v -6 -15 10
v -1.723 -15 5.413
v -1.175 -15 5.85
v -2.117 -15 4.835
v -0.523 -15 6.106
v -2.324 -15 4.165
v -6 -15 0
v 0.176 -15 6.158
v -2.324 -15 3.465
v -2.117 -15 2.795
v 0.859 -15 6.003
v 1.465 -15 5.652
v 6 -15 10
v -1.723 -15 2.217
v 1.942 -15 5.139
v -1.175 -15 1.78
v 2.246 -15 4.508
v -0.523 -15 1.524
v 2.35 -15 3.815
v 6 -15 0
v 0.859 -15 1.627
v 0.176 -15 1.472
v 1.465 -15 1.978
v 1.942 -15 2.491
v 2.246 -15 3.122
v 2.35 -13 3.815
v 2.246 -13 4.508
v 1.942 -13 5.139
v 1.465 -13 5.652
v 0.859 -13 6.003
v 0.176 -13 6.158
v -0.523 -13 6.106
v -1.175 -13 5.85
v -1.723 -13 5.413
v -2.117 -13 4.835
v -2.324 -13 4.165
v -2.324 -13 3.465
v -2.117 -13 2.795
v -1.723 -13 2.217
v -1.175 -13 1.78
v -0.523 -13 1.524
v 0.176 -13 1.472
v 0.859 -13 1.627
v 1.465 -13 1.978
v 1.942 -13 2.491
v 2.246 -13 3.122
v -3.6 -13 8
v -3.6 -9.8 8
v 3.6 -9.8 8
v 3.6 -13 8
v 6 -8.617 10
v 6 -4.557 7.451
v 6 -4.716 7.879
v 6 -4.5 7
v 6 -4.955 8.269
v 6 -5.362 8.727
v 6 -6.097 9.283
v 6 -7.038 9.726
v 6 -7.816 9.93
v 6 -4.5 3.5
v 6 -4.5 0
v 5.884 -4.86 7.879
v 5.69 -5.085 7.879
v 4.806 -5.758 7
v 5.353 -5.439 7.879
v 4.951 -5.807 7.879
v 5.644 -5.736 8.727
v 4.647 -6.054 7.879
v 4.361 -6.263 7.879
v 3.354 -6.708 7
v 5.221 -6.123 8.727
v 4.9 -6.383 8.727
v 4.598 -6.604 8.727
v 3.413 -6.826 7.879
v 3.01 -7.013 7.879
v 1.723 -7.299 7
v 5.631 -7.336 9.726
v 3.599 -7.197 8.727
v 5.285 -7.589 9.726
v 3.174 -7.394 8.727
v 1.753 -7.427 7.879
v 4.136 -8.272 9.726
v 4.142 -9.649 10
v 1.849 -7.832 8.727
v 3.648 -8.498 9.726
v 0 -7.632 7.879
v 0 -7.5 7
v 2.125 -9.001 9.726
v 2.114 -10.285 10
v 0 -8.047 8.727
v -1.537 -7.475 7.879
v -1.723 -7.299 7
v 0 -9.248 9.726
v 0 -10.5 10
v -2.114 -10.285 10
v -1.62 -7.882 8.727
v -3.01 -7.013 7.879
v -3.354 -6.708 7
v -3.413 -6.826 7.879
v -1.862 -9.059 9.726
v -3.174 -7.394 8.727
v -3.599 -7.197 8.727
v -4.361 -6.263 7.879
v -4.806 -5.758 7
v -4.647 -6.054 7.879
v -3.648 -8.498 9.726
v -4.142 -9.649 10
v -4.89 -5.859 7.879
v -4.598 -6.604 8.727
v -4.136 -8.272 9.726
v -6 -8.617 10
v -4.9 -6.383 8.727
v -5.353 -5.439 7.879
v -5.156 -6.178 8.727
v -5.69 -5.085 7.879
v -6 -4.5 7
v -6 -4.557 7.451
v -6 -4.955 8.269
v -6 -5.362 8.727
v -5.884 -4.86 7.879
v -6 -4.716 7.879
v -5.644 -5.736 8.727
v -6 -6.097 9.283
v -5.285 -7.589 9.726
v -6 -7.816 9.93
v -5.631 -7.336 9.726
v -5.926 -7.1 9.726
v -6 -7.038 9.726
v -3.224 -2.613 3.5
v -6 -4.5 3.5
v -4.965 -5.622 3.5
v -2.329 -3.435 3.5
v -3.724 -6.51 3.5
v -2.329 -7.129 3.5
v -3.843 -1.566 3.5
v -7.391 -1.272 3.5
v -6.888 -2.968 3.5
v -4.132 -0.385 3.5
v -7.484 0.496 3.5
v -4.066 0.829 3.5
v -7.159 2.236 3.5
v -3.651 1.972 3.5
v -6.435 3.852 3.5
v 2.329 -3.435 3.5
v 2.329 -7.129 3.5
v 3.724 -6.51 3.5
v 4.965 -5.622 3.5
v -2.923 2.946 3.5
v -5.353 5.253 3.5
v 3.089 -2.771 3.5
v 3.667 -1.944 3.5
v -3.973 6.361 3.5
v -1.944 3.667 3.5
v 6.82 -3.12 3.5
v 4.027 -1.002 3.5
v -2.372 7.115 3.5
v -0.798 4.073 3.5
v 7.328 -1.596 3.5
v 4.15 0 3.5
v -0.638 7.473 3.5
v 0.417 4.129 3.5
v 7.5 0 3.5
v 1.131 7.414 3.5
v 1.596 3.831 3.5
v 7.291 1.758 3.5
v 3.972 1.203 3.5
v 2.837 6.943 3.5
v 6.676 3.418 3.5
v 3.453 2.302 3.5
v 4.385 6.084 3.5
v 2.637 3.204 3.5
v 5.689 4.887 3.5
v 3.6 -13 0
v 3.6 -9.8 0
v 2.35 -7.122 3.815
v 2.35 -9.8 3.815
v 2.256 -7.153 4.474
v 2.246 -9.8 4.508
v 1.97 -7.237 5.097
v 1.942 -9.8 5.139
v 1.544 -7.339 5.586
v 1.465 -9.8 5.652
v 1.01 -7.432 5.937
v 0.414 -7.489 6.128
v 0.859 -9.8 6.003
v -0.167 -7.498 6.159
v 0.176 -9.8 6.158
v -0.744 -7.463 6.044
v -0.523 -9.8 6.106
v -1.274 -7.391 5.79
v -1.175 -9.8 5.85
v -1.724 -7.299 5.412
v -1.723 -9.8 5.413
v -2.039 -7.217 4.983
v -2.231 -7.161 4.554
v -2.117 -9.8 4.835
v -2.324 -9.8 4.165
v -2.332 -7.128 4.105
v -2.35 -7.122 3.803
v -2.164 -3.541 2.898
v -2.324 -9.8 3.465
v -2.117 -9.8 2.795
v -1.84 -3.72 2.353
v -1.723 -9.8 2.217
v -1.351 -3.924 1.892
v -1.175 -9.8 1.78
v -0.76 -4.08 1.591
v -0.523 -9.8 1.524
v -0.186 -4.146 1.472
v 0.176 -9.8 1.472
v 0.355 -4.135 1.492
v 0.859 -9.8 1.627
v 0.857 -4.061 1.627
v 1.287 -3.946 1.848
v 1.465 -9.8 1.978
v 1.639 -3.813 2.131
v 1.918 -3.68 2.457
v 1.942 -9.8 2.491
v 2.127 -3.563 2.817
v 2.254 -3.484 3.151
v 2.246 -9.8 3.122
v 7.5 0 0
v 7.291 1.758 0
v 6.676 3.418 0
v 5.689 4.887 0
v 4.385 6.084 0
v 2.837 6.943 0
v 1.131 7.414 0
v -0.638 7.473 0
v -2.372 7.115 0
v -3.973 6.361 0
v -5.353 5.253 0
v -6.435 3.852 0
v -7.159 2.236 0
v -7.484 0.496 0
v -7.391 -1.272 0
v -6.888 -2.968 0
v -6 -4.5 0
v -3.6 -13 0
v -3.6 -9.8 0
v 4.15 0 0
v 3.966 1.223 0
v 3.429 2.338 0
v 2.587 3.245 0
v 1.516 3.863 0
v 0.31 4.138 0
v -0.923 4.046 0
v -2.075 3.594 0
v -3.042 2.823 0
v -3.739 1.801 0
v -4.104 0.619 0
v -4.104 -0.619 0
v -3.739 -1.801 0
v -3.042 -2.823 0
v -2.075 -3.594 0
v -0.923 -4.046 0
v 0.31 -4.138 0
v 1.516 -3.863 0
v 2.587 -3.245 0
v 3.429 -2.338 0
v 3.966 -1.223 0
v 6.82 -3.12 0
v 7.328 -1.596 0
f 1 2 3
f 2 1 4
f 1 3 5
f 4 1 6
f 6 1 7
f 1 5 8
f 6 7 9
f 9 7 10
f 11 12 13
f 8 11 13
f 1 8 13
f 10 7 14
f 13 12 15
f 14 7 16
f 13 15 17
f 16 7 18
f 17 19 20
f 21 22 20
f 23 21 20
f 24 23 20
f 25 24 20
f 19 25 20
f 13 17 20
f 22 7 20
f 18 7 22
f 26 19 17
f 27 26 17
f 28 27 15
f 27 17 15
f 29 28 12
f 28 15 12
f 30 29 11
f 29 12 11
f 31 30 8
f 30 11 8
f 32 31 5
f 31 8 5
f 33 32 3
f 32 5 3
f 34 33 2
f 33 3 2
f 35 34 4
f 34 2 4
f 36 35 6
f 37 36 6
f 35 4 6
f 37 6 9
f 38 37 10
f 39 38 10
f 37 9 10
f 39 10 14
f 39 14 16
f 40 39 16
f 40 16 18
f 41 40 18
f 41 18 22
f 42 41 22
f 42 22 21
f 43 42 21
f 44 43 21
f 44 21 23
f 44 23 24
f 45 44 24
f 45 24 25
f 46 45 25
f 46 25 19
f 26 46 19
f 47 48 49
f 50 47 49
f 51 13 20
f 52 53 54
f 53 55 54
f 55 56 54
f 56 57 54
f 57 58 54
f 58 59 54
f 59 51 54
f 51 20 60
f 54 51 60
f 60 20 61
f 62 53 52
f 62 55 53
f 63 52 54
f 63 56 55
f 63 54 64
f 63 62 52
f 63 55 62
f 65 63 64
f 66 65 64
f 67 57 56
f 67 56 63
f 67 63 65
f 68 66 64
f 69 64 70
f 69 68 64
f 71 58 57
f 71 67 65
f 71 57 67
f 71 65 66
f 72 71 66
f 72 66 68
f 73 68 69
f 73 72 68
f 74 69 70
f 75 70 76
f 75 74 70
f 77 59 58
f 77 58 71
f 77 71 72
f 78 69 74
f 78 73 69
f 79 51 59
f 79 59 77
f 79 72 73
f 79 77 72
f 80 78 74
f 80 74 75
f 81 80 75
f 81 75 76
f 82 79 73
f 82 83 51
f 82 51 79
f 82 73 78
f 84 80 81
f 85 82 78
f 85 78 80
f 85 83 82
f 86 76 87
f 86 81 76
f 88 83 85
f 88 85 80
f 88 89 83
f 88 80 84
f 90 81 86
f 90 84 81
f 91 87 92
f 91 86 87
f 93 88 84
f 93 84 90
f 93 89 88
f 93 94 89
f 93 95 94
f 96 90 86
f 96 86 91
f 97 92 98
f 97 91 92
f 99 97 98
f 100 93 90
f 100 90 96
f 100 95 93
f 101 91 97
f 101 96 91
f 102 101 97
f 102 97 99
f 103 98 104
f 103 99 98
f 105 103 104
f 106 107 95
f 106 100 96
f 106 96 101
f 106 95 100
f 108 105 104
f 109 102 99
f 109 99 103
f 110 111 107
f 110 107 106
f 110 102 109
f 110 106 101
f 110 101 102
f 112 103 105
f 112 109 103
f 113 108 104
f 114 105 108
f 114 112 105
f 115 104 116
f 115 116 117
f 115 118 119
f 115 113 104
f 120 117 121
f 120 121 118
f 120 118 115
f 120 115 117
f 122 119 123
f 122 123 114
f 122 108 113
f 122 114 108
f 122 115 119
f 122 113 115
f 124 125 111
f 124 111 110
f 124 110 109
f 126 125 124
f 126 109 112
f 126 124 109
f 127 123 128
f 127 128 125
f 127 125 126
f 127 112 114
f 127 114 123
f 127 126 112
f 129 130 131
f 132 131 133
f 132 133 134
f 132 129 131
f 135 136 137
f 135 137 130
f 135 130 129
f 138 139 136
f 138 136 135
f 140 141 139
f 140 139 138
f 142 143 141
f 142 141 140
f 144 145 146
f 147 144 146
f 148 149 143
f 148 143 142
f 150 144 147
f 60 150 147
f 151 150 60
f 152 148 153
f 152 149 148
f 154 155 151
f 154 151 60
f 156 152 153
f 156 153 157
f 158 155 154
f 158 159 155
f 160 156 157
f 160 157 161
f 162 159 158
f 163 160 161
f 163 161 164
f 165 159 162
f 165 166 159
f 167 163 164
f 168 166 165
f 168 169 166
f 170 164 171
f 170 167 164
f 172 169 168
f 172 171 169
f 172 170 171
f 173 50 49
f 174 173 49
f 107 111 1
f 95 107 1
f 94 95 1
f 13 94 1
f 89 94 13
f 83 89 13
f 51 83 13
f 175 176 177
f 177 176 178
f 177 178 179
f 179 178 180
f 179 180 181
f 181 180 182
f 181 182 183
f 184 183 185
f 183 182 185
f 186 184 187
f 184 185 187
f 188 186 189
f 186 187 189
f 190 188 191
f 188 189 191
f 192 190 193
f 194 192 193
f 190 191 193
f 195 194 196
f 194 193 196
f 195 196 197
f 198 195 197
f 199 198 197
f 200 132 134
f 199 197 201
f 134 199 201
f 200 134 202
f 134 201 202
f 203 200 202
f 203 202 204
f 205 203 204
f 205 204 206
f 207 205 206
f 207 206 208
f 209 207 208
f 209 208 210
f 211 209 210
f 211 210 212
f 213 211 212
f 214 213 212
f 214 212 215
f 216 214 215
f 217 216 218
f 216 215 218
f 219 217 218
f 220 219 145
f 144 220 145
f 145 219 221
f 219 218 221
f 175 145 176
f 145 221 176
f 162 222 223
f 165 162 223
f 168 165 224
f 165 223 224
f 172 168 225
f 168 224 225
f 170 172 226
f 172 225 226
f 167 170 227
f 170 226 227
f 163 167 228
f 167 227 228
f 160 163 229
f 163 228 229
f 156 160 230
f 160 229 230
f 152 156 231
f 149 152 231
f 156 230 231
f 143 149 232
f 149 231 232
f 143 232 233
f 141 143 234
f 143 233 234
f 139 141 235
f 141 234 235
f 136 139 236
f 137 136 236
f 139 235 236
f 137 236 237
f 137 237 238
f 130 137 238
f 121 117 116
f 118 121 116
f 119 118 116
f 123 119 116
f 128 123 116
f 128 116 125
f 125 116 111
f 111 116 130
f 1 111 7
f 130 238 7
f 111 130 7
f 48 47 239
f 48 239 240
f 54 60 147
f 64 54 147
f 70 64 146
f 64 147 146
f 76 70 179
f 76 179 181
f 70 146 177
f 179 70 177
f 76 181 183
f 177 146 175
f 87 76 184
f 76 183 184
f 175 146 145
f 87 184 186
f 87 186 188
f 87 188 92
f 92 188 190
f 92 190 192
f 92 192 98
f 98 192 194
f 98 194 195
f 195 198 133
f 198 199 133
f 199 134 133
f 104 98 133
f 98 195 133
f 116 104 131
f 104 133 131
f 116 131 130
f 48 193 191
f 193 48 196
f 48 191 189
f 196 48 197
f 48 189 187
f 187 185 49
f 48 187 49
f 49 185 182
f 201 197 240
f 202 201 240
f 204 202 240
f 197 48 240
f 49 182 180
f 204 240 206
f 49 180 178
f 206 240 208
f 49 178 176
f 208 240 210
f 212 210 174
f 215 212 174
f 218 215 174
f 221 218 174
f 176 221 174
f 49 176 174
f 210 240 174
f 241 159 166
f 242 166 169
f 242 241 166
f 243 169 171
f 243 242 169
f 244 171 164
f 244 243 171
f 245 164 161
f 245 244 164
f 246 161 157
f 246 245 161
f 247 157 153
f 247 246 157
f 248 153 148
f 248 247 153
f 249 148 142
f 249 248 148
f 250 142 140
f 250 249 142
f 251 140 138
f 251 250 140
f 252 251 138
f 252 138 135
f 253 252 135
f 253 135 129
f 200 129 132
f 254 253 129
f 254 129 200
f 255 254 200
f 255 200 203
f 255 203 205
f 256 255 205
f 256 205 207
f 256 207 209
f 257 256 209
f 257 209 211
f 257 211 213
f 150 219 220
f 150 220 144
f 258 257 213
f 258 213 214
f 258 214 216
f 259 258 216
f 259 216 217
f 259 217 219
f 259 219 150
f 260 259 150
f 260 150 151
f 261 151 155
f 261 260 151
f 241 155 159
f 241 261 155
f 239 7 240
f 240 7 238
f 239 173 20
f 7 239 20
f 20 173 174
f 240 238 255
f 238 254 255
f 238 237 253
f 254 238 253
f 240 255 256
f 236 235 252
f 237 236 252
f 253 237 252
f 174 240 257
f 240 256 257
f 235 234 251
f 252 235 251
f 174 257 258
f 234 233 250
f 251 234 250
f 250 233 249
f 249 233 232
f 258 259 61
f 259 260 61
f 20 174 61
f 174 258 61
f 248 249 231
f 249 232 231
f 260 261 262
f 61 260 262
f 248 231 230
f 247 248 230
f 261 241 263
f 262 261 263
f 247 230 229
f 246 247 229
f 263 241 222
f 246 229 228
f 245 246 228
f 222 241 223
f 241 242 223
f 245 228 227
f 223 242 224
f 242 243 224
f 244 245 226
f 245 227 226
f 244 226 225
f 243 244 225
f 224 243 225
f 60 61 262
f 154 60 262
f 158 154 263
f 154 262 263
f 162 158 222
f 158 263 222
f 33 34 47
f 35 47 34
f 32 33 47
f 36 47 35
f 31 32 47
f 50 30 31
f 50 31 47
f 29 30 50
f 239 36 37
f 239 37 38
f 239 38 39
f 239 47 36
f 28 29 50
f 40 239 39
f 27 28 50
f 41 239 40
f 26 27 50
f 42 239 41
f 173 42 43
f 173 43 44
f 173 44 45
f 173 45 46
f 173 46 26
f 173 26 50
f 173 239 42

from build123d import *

# Parameters (mm, degrees)
F0_R     = 4.15
F1_DEPTH = 3.5
F2_DEPTH = 10
F3_R     = 2.35
F4_DEPTH = 12.5794738247
F5_W     = 7.2
F5_H     = 3.2
F6_DEPTH = 8
F7_R     = 3


with BuildPart() as f1:
    # F0 (on Top) → F1 (new body)
    with BuildSketch(Plane.XY):
        with BuildLine():
            ThreePointArc((6, -4.5), (7.1151247354, -2.3717082451), (7.5, 0))
            ThreePointArc((7.5, 0), (-2.3717082451, 7.1151247354), (-6, -4.5))
            ThreePointArc((-6, -4.5), (0, -7.5), (6, -4.5))
        make_face()
        Circle(F0_R, mode=Mode.SUBTRACT)
    extrude(amount=F1_DEPTH)

    # F0 (on Top) → F2 (join)
    with BuildSketch(Plane.XY):
        with BuildLine():
            ThreePointArc((6, -4.5), (0, -7.5), (-6, -4.5))
            Line((-6, -4.5), (-6, -15))
            Line((-6, -15), (6, -15))
            Line((6, -15), (6, -4.5))
        make_face()
    extrude(amount=F2_DEPTH)

    # F3 (on face) → F4 (cut, up to face)
    with BuildSketch(Plane.XZ.offset(15)):
        with Locations((0, 3.815)):
            Circle(F3_R)
    extrude(amount=-F4_DEPTH, mode=Mode.SUBTRACT)

    # F5 (on face) → F6 (cut)
    with BuildSketch(Plane.XY):
        with Locations((0, -11.4)):
            Rectangle(F5_W, F5_H)
    extrude(amount=F6_DEPTH, mode=Mode.SUBTRACT)

    # F7
    f7_edges = [f1.edges().sort_by_distance(p)[0] for p in [
        (0, -7.5, 10),
    ]]
    fillet(f7_edges, radius=F7_R)


solid = f1.part
